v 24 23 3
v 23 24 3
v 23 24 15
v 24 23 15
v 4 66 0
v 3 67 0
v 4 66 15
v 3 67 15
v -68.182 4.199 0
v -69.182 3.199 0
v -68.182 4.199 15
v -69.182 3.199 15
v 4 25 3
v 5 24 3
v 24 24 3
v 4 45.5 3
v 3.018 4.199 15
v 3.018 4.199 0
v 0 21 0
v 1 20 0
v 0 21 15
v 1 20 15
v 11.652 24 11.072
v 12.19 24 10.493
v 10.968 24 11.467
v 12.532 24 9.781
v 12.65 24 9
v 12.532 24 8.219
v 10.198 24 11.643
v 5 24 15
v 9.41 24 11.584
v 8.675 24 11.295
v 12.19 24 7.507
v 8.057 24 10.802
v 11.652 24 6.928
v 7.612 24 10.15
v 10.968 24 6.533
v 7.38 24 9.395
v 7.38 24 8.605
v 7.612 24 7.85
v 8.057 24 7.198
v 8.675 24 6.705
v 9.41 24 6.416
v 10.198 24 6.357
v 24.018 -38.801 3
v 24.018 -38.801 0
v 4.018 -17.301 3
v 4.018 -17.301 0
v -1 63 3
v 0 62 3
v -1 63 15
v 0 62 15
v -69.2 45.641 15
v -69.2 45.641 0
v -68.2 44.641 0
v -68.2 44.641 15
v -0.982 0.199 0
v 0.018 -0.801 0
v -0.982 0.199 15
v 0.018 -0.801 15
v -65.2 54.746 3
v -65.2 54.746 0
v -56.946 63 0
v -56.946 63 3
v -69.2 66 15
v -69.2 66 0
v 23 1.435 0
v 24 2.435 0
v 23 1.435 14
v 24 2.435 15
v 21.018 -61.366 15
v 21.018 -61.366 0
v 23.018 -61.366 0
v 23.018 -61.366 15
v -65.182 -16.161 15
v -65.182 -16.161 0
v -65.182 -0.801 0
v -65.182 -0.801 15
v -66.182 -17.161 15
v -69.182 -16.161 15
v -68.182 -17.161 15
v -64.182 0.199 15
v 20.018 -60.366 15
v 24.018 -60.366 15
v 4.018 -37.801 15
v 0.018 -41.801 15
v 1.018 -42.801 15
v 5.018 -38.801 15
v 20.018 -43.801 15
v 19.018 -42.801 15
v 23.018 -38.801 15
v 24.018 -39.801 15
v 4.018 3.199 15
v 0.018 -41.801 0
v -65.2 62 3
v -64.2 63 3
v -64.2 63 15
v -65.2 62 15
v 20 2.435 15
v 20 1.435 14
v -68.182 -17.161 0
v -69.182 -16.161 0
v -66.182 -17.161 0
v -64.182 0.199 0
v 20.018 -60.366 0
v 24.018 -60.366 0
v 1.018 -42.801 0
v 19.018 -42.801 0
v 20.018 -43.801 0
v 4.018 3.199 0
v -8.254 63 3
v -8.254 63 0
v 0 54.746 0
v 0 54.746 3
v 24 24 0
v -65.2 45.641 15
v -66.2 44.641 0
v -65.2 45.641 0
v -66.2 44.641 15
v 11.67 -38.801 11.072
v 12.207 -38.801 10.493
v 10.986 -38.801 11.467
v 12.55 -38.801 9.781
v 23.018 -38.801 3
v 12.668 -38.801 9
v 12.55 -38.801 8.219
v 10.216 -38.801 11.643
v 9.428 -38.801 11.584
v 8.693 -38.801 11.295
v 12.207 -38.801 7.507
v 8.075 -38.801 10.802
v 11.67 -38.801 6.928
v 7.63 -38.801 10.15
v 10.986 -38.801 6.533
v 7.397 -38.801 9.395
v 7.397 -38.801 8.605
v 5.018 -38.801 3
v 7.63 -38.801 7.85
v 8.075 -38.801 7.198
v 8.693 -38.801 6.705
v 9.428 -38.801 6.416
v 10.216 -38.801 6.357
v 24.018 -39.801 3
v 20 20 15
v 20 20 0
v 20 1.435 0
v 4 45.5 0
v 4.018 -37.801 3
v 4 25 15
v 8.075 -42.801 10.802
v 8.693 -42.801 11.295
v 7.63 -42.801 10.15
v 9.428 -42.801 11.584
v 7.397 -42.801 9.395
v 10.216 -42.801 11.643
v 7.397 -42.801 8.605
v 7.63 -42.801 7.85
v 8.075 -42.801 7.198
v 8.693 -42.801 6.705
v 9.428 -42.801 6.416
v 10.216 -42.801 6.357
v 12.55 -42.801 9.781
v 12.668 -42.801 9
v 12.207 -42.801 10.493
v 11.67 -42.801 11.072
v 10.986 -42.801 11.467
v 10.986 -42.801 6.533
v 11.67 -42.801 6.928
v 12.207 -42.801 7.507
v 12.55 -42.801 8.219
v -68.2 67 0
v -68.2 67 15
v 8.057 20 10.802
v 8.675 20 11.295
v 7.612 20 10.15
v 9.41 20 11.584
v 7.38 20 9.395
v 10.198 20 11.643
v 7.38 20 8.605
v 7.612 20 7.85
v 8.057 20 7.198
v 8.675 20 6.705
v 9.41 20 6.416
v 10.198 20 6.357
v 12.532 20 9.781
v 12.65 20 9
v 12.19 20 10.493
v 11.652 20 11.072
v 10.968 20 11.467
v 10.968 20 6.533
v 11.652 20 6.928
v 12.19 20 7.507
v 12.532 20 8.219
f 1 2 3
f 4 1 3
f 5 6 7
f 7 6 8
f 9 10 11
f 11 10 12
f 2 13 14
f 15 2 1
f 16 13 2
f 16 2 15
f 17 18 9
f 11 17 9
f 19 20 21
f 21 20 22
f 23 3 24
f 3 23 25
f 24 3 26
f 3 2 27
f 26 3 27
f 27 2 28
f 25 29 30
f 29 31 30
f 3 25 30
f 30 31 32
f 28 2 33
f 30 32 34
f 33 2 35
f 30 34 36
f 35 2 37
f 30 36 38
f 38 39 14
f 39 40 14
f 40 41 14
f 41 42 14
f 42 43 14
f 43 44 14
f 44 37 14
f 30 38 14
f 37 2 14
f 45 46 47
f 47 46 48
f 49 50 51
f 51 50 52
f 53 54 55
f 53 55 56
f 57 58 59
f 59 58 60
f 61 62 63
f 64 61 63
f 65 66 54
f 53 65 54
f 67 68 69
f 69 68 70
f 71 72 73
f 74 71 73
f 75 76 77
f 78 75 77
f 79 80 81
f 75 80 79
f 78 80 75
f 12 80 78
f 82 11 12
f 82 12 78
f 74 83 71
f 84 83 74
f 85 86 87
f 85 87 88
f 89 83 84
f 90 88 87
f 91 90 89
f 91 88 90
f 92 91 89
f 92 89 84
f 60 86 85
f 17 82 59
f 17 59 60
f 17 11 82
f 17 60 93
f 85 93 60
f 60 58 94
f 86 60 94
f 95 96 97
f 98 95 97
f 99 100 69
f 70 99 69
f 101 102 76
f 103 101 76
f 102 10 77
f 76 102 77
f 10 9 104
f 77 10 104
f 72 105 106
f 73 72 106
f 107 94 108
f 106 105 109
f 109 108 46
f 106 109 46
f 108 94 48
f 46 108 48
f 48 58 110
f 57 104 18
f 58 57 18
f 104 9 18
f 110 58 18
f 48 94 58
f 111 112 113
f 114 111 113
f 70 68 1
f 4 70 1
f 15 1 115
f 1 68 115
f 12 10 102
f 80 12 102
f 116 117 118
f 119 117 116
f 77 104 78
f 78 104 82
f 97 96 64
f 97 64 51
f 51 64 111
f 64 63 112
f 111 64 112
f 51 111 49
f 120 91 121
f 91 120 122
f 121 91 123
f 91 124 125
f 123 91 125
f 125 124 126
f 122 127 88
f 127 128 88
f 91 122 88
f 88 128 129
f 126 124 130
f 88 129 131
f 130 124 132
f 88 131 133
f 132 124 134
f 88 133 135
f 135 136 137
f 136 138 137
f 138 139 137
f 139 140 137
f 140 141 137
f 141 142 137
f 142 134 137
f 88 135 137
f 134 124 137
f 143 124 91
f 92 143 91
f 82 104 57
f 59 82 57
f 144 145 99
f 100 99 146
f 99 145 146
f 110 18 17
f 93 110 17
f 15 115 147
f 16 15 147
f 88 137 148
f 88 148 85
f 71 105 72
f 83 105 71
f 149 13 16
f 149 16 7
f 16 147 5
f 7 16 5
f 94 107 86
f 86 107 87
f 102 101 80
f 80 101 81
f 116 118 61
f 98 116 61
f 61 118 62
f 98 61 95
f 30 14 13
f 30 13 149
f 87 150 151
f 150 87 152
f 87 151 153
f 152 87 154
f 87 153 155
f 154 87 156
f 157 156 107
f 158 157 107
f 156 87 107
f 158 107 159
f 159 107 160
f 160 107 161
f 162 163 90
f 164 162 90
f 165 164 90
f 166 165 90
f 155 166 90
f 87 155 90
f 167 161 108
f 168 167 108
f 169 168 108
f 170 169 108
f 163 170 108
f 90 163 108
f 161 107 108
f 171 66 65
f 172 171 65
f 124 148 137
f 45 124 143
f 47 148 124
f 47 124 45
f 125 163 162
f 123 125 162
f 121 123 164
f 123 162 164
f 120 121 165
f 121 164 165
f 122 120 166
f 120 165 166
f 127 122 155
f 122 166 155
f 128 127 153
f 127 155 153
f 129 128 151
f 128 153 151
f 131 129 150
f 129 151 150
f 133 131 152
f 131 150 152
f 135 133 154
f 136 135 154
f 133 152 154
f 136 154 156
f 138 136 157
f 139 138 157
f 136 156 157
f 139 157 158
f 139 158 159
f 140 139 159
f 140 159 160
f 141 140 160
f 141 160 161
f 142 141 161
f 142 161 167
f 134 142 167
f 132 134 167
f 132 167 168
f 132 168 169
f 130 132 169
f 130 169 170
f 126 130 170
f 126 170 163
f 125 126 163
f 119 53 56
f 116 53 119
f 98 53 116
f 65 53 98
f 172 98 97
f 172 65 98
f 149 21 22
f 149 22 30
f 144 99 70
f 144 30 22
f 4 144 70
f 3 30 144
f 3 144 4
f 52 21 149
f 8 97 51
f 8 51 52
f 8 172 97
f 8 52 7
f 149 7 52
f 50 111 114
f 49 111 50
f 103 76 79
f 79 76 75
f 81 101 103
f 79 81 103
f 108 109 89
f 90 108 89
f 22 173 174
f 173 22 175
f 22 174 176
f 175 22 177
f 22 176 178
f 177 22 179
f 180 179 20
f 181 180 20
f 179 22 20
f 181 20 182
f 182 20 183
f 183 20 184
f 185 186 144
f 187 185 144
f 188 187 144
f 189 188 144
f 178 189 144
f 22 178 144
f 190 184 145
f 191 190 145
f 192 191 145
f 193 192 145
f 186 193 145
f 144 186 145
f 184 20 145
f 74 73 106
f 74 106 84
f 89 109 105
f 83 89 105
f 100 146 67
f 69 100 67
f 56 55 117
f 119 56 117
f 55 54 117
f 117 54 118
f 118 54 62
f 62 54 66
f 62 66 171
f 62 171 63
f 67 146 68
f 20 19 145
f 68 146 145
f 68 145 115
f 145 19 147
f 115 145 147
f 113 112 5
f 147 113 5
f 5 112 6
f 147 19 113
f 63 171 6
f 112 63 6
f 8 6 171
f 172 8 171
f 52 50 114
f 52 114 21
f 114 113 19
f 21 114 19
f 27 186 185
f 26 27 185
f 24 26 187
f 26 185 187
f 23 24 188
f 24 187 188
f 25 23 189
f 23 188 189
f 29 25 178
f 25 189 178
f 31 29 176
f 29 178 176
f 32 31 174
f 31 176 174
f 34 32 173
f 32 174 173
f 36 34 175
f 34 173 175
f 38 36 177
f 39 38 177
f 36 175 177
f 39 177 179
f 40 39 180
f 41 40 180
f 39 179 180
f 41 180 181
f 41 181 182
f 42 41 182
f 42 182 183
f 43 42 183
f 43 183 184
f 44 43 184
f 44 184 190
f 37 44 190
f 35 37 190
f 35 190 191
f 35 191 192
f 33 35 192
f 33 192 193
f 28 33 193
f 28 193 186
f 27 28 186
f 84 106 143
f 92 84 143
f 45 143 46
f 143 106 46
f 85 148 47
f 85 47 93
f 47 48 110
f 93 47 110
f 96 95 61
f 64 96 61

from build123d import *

# Parameters (mm, degrees)
F1_DEPTH  = 15
F2_DEPTH  = 3
F3_SIZE   = 1
F4_R      = 2.65
F5_DEPTH  = 25
F7_DEPTH  = 15
F8_DEPTH  = 3
F9_R      = 2.65
F10_DEPTH = 25
F11_SIZE  = 1


with BuildPart() as f1:
    # F0 (on Top) → F1 (new body)
    with BuildSketch(Plane.XY):
        Polygon((20, 20), (20, 1.434709), (24, 1.434709), (24, 24), (4, 24), (4, 45.5), (4, 67), (-69.2, 67), (-69.2, 44.640538), (-65.2, 44.640538), (-65.2, 54.745654), (-65.2, 63), (-56.945654, 63), (-8.254346, 63), (0, 63), (0, 54.745654), (0, 20), align=None)
    extrude(amount=F1_DEPTH)

    # F0 (on Top) → F2 (join)
    with BuildSketch(Plane.XY):
        Polygon((-65.2, 54.745654), (-56.945654, 63), (-65.2, 63), align=None)
        Polygon((-8.254346, 63), (0, 54.745654), (0, 63), align=None)
        Polygon((4, 24), (24, 24), (4, 45.5), align=None)
    extrude(amount=F2_DEPTH)

    # F3
    f3_edges = [f1.edges().sort_by_distance(p)[0] for p in [
        (0, 63, 9),
        (-65.2, 63, 9),
        (4, 24, 9),
        (24, 24, 9),
        (4, 67, 7.5),
        (0, 20, 7.5),
        (22, 1.434709, 15),
        (24, 1.434709, 7.5),
        (-69.2, 67, 7.5),
        (-69.2, 44.640538, 7.5),
        (-65.2, 44.640538, 7.5),
    ]]
    chamfer(f3_edges, length=F3_SIZE)

    # F4 (on face) → F5 (cut)
    with BuildSketch(Plane.XZ.offset(-20)):
        with Locations((10, 9)):
            Circle(F4_R)
    extrude(amount=-F5_DEPTH, mode=Mode.SUBTRACT)


with BuildPart() as f7:
    # F6 (on Top) → F7 (new body)
    with BuildSketch(Plane.XY):
        Polygon((20.017605, -42.801045), (20.017605, -61.366337), (24.017605, -61.366337), (24.017605, -38.801045), (4.017605, -38.801045), (4.017605, -17.301045), (4.017605, 4.198955), (-69.182395, 4.198955), (-69.182395, -17.160508), (-65.182395, -17.160508), (-65.182395, -7.055392), (-65.182395, 0.198955), (-57.928049, 0.198955), (-7.236742, 0.198955), (0.017605, 0.198955), (0.017605, -7.055392), (0.017605, -42.801045), align=None)
    extrude(amount=F7_DEPTH)

    # F6 (on Top) → F8 (join)
    with BuildSketch(Plane.XY):
        Polygon((4.017605, -38.801045), (24.017605, -38.801045), (4.017605, -17.301045), align=None)
    extrude(amount=F8_DEPTH)

    # F9 (on face) → F10 (cut)
    with BuildSketch(Plane.XZ.offset(42.801045)):
        with Locations((10.017605, 9)):
            Circle(F9_R)
    extrude(amount=-F10_DEPTH, mode=Mode.SUBTRACT)

    # F11
    f11_edges = [f7.edges().sort_by_distance(p)[0] for p in [
        (-69.182395, 4.198955, 7.5),
        (-69.182395, -17.160508, 7.5),
        (-65.182395, -17.160508, 7.5),
        (-65.182395, 0.198955, 7.5),
        (0.017605, -42.801045, 7.5),
        (4.017605, 4.198955, 7.5),
        (0.017605, 0.198955, 7.5),
        (4.017605, -38.801045, 9),
        (24.017605, -38.801045, 9),
        (24.017605, -61.366337, 7.5),
        (20.017605, -61.366337, 7.5),
        (20.017605, -42.801045, 7.5),
    ]]
    chamfer(f11_edges, length=F11_SIZE)


solid = Compound([f1.part, f7.part])
